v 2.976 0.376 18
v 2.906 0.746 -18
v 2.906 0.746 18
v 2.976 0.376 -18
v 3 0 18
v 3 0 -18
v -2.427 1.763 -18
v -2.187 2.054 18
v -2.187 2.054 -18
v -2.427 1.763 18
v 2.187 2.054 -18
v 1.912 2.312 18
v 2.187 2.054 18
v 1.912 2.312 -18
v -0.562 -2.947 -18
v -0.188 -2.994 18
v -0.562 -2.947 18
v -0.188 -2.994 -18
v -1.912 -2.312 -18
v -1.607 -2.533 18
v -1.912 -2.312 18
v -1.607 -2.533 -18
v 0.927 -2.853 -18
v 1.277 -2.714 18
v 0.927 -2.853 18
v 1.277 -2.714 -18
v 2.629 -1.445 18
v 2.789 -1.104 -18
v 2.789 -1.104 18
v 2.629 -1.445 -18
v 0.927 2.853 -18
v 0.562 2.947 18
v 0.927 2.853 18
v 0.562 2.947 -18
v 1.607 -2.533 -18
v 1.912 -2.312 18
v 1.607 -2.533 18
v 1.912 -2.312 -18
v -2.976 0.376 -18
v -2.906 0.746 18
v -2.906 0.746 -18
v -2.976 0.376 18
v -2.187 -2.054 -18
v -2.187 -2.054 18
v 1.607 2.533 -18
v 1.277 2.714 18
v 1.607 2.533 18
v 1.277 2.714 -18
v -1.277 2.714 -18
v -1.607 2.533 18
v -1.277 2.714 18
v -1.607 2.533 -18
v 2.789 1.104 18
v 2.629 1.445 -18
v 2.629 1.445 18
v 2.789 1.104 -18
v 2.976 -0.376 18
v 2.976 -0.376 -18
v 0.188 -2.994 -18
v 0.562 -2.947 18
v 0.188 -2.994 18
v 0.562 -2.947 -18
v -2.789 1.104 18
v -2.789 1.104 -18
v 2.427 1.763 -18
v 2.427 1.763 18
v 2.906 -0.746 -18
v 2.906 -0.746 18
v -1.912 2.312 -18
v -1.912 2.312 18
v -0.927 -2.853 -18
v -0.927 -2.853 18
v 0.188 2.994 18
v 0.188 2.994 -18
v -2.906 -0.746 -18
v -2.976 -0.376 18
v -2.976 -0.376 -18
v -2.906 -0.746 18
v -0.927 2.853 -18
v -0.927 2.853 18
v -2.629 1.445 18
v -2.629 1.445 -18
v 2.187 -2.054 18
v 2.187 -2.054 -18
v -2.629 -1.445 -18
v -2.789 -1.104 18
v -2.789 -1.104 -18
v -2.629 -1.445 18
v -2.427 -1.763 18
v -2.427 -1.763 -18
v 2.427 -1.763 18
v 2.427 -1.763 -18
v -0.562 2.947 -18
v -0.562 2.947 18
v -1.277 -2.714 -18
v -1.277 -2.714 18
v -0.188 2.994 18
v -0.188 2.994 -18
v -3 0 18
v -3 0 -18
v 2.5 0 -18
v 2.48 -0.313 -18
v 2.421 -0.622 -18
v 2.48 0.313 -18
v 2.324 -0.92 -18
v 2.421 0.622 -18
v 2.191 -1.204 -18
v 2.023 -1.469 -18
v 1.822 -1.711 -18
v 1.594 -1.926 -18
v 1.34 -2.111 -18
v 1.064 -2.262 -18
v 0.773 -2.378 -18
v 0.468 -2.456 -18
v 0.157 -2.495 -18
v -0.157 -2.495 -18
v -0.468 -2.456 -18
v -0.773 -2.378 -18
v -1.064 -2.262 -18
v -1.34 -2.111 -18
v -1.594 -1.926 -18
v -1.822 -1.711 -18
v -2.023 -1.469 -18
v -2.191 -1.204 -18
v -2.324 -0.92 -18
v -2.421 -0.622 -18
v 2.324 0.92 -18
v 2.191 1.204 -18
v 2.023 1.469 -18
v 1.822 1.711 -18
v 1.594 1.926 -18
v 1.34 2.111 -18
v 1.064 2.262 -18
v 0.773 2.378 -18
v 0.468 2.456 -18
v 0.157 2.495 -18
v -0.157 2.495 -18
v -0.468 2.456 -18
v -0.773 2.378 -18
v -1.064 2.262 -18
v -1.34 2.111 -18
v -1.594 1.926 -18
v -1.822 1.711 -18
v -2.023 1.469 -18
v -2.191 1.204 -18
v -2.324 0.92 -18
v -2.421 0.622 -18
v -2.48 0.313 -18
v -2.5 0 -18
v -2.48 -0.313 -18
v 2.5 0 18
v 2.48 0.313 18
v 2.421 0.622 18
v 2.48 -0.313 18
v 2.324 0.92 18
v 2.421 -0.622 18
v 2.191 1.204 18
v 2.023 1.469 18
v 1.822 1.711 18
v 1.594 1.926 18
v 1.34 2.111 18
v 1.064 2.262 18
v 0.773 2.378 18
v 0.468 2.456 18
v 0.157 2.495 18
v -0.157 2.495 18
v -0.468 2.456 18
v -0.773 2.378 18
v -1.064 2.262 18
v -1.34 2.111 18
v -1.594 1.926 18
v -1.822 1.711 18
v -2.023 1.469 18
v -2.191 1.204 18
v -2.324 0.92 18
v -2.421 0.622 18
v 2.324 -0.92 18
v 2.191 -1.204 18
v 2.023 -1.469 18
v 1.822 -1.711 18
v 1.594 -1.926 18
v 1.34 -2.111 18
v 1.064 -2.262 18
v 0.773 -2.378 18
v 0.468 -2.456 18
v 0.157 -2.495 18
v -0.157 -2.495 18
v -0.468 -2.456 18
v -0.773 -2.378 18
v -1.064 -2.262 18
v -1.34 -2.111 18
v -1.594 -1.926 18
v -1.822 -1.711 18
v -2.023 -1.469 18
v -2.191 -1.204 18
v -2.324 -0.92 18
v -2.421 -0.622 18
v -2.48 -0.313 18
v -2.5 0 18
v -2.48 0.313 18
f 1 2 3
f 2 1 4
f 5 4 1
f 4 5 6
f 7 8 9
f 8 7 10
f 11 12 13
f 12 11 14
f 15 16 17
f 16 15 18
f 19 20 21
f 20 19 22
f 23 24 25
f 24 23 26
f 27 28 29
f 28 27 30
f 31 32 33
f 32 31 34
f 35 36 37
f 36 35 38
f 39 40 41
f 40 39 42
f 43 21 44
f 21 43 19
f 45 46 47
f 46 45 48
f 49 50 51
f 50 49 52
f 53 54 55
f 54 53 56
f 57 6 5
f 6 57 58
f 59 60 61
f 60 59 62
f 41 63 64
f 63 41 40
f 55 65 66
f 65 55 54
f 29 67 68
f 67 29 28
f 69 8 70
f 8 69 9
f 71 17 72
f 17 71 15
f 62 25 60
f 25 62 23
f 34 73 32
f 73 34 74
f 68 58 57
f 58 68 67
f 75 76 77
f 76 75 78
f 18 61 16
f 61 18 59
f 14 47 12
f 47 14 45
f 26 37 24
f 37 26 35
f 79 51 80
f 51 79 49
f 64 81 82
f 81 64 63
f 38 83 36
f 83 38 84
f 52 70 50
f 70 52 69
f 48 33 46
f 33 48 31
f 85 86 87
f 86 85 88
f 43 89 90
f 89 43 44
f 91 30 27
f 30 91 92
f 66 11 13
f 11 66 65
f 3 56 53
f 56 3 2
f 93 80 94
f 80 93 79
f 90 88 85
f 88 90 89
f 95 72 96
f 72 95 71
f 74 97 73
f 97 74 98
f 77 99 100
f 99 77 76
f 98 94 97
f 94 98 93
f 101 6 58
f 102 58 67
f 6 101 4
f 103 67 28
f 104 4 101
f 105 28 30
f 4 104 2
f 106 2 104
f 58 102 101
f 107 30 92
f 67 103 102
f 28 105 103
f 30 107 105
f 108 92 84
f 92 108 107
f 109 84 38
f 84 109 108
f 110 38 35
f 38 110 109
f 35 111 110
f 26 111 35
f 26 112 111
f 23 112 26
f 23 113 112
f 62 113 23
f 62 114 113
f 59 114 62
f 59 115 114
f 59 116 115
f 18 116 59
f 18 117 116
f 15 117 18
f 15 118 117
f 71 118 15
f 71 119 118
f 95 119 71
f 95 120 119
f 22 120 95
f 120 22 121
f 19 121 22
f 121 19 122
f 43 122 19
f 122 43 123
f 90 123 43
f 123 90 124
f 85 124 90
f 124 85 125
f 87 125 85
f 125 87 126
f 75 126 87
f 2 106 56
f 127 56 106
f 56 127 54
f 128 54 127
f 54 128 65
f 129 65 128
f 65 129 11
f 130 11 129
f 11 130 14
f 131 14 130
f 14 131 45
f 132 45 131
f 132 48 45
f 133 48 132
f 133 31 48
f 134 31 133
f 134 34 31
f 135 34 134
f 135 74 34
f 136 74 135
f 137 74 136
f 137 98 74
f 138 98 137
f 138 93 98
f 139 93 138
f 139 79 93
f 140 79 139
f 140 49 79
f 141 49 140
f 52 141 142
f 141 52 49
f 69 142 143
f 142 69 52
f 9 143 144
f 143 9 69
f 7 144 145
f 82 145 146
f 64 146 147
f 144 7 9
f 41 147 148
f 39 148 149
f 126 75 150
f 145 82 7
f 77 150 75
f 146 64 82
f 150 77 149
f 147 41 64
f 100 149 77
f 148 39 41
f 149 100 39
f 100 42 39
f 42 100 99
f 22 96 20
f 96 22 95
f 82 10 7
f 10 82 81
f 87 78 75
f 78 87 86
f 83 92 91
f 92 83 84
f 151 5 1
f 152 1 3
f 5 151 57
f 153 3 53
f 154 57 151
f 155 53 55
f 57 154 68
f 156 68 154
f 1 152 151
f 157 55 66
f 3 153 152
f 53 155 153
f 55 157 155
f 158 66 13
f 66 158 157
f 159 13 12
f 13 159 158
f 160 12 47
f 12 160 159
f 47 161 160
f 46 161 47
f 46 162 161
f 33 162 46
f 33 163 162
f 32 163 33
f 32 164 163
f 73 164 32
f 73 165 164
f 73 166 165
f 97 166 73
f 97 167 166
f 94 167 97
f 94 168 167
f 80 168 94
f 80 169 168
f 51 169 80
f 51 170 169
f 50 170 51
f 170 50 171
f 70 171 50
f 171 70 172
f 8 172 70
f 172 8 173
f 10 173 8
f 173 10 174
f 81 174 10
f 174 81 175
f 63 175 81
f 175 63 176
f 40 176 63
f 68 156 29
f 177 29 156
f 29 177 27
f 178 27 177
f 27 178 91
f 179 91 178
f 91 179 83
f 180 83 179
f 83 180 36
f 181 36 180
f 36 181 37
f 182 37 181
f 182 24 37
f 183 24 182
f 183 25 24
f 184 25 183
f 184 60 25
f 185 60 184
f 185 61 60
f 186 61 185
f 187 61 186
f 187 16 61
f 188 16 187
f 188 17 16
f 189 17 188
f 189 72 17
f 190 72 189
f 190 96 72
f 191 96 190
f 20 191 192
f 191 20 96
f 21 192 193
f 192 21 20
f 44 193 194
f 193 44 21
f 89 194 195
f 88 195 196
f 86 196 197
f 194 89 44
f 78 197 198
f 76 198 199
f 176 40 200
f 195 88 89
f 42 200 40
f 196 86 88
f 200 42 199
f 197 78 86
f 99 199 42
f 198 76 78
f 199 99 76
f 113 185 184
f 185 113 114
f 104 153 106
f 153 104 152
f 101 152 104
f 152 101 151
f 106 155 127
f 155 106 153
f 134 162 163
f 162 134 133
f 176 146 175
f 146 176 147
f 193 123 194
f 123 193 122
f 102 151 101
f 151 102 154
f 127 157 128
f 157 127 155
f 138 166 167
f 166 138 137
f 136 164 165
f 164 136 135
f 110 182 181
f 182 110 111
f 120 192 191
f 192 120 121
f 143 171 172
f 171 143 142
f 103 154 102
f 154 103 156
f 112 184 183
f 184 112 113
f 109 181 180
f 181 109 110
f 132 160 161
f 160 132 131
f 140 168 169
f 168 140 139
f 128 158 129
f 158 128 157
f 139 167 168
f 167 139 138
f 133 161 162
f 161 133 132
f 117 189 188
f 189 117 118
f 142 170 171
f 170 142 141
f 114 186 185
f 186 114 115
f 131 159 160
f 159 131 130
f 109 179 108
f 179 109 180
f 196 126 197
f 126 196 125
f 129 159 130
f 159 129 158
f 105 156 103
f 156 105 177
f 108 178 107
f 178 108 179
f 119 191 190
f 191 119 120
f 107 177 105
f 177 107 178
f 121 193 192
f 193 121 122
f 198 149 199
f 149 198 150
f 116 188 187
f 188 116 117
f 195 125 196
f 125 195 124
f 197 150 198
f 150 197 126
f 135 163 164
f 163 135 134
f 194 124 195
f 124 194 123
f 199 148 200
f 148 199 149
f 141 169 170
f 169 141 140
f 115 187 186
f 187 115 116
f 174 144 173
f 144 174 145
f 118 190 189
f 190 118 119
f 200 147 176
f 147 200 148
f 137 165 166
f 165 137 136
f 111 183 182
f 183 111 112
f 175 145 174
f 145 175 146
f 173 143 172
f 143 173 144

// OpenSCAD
$fn = 50;


difference() {
	union() {
		translate(v = [0, 0, -18.0000000000]) {
			cylinder(h = 36, r = 3.0000000000);
		}
	}
	union() {
		translate(v = [0, 0, -100.0000000000]) {
			cylinder(h = 200, r = 2.5000000000);
		}
	}
}
